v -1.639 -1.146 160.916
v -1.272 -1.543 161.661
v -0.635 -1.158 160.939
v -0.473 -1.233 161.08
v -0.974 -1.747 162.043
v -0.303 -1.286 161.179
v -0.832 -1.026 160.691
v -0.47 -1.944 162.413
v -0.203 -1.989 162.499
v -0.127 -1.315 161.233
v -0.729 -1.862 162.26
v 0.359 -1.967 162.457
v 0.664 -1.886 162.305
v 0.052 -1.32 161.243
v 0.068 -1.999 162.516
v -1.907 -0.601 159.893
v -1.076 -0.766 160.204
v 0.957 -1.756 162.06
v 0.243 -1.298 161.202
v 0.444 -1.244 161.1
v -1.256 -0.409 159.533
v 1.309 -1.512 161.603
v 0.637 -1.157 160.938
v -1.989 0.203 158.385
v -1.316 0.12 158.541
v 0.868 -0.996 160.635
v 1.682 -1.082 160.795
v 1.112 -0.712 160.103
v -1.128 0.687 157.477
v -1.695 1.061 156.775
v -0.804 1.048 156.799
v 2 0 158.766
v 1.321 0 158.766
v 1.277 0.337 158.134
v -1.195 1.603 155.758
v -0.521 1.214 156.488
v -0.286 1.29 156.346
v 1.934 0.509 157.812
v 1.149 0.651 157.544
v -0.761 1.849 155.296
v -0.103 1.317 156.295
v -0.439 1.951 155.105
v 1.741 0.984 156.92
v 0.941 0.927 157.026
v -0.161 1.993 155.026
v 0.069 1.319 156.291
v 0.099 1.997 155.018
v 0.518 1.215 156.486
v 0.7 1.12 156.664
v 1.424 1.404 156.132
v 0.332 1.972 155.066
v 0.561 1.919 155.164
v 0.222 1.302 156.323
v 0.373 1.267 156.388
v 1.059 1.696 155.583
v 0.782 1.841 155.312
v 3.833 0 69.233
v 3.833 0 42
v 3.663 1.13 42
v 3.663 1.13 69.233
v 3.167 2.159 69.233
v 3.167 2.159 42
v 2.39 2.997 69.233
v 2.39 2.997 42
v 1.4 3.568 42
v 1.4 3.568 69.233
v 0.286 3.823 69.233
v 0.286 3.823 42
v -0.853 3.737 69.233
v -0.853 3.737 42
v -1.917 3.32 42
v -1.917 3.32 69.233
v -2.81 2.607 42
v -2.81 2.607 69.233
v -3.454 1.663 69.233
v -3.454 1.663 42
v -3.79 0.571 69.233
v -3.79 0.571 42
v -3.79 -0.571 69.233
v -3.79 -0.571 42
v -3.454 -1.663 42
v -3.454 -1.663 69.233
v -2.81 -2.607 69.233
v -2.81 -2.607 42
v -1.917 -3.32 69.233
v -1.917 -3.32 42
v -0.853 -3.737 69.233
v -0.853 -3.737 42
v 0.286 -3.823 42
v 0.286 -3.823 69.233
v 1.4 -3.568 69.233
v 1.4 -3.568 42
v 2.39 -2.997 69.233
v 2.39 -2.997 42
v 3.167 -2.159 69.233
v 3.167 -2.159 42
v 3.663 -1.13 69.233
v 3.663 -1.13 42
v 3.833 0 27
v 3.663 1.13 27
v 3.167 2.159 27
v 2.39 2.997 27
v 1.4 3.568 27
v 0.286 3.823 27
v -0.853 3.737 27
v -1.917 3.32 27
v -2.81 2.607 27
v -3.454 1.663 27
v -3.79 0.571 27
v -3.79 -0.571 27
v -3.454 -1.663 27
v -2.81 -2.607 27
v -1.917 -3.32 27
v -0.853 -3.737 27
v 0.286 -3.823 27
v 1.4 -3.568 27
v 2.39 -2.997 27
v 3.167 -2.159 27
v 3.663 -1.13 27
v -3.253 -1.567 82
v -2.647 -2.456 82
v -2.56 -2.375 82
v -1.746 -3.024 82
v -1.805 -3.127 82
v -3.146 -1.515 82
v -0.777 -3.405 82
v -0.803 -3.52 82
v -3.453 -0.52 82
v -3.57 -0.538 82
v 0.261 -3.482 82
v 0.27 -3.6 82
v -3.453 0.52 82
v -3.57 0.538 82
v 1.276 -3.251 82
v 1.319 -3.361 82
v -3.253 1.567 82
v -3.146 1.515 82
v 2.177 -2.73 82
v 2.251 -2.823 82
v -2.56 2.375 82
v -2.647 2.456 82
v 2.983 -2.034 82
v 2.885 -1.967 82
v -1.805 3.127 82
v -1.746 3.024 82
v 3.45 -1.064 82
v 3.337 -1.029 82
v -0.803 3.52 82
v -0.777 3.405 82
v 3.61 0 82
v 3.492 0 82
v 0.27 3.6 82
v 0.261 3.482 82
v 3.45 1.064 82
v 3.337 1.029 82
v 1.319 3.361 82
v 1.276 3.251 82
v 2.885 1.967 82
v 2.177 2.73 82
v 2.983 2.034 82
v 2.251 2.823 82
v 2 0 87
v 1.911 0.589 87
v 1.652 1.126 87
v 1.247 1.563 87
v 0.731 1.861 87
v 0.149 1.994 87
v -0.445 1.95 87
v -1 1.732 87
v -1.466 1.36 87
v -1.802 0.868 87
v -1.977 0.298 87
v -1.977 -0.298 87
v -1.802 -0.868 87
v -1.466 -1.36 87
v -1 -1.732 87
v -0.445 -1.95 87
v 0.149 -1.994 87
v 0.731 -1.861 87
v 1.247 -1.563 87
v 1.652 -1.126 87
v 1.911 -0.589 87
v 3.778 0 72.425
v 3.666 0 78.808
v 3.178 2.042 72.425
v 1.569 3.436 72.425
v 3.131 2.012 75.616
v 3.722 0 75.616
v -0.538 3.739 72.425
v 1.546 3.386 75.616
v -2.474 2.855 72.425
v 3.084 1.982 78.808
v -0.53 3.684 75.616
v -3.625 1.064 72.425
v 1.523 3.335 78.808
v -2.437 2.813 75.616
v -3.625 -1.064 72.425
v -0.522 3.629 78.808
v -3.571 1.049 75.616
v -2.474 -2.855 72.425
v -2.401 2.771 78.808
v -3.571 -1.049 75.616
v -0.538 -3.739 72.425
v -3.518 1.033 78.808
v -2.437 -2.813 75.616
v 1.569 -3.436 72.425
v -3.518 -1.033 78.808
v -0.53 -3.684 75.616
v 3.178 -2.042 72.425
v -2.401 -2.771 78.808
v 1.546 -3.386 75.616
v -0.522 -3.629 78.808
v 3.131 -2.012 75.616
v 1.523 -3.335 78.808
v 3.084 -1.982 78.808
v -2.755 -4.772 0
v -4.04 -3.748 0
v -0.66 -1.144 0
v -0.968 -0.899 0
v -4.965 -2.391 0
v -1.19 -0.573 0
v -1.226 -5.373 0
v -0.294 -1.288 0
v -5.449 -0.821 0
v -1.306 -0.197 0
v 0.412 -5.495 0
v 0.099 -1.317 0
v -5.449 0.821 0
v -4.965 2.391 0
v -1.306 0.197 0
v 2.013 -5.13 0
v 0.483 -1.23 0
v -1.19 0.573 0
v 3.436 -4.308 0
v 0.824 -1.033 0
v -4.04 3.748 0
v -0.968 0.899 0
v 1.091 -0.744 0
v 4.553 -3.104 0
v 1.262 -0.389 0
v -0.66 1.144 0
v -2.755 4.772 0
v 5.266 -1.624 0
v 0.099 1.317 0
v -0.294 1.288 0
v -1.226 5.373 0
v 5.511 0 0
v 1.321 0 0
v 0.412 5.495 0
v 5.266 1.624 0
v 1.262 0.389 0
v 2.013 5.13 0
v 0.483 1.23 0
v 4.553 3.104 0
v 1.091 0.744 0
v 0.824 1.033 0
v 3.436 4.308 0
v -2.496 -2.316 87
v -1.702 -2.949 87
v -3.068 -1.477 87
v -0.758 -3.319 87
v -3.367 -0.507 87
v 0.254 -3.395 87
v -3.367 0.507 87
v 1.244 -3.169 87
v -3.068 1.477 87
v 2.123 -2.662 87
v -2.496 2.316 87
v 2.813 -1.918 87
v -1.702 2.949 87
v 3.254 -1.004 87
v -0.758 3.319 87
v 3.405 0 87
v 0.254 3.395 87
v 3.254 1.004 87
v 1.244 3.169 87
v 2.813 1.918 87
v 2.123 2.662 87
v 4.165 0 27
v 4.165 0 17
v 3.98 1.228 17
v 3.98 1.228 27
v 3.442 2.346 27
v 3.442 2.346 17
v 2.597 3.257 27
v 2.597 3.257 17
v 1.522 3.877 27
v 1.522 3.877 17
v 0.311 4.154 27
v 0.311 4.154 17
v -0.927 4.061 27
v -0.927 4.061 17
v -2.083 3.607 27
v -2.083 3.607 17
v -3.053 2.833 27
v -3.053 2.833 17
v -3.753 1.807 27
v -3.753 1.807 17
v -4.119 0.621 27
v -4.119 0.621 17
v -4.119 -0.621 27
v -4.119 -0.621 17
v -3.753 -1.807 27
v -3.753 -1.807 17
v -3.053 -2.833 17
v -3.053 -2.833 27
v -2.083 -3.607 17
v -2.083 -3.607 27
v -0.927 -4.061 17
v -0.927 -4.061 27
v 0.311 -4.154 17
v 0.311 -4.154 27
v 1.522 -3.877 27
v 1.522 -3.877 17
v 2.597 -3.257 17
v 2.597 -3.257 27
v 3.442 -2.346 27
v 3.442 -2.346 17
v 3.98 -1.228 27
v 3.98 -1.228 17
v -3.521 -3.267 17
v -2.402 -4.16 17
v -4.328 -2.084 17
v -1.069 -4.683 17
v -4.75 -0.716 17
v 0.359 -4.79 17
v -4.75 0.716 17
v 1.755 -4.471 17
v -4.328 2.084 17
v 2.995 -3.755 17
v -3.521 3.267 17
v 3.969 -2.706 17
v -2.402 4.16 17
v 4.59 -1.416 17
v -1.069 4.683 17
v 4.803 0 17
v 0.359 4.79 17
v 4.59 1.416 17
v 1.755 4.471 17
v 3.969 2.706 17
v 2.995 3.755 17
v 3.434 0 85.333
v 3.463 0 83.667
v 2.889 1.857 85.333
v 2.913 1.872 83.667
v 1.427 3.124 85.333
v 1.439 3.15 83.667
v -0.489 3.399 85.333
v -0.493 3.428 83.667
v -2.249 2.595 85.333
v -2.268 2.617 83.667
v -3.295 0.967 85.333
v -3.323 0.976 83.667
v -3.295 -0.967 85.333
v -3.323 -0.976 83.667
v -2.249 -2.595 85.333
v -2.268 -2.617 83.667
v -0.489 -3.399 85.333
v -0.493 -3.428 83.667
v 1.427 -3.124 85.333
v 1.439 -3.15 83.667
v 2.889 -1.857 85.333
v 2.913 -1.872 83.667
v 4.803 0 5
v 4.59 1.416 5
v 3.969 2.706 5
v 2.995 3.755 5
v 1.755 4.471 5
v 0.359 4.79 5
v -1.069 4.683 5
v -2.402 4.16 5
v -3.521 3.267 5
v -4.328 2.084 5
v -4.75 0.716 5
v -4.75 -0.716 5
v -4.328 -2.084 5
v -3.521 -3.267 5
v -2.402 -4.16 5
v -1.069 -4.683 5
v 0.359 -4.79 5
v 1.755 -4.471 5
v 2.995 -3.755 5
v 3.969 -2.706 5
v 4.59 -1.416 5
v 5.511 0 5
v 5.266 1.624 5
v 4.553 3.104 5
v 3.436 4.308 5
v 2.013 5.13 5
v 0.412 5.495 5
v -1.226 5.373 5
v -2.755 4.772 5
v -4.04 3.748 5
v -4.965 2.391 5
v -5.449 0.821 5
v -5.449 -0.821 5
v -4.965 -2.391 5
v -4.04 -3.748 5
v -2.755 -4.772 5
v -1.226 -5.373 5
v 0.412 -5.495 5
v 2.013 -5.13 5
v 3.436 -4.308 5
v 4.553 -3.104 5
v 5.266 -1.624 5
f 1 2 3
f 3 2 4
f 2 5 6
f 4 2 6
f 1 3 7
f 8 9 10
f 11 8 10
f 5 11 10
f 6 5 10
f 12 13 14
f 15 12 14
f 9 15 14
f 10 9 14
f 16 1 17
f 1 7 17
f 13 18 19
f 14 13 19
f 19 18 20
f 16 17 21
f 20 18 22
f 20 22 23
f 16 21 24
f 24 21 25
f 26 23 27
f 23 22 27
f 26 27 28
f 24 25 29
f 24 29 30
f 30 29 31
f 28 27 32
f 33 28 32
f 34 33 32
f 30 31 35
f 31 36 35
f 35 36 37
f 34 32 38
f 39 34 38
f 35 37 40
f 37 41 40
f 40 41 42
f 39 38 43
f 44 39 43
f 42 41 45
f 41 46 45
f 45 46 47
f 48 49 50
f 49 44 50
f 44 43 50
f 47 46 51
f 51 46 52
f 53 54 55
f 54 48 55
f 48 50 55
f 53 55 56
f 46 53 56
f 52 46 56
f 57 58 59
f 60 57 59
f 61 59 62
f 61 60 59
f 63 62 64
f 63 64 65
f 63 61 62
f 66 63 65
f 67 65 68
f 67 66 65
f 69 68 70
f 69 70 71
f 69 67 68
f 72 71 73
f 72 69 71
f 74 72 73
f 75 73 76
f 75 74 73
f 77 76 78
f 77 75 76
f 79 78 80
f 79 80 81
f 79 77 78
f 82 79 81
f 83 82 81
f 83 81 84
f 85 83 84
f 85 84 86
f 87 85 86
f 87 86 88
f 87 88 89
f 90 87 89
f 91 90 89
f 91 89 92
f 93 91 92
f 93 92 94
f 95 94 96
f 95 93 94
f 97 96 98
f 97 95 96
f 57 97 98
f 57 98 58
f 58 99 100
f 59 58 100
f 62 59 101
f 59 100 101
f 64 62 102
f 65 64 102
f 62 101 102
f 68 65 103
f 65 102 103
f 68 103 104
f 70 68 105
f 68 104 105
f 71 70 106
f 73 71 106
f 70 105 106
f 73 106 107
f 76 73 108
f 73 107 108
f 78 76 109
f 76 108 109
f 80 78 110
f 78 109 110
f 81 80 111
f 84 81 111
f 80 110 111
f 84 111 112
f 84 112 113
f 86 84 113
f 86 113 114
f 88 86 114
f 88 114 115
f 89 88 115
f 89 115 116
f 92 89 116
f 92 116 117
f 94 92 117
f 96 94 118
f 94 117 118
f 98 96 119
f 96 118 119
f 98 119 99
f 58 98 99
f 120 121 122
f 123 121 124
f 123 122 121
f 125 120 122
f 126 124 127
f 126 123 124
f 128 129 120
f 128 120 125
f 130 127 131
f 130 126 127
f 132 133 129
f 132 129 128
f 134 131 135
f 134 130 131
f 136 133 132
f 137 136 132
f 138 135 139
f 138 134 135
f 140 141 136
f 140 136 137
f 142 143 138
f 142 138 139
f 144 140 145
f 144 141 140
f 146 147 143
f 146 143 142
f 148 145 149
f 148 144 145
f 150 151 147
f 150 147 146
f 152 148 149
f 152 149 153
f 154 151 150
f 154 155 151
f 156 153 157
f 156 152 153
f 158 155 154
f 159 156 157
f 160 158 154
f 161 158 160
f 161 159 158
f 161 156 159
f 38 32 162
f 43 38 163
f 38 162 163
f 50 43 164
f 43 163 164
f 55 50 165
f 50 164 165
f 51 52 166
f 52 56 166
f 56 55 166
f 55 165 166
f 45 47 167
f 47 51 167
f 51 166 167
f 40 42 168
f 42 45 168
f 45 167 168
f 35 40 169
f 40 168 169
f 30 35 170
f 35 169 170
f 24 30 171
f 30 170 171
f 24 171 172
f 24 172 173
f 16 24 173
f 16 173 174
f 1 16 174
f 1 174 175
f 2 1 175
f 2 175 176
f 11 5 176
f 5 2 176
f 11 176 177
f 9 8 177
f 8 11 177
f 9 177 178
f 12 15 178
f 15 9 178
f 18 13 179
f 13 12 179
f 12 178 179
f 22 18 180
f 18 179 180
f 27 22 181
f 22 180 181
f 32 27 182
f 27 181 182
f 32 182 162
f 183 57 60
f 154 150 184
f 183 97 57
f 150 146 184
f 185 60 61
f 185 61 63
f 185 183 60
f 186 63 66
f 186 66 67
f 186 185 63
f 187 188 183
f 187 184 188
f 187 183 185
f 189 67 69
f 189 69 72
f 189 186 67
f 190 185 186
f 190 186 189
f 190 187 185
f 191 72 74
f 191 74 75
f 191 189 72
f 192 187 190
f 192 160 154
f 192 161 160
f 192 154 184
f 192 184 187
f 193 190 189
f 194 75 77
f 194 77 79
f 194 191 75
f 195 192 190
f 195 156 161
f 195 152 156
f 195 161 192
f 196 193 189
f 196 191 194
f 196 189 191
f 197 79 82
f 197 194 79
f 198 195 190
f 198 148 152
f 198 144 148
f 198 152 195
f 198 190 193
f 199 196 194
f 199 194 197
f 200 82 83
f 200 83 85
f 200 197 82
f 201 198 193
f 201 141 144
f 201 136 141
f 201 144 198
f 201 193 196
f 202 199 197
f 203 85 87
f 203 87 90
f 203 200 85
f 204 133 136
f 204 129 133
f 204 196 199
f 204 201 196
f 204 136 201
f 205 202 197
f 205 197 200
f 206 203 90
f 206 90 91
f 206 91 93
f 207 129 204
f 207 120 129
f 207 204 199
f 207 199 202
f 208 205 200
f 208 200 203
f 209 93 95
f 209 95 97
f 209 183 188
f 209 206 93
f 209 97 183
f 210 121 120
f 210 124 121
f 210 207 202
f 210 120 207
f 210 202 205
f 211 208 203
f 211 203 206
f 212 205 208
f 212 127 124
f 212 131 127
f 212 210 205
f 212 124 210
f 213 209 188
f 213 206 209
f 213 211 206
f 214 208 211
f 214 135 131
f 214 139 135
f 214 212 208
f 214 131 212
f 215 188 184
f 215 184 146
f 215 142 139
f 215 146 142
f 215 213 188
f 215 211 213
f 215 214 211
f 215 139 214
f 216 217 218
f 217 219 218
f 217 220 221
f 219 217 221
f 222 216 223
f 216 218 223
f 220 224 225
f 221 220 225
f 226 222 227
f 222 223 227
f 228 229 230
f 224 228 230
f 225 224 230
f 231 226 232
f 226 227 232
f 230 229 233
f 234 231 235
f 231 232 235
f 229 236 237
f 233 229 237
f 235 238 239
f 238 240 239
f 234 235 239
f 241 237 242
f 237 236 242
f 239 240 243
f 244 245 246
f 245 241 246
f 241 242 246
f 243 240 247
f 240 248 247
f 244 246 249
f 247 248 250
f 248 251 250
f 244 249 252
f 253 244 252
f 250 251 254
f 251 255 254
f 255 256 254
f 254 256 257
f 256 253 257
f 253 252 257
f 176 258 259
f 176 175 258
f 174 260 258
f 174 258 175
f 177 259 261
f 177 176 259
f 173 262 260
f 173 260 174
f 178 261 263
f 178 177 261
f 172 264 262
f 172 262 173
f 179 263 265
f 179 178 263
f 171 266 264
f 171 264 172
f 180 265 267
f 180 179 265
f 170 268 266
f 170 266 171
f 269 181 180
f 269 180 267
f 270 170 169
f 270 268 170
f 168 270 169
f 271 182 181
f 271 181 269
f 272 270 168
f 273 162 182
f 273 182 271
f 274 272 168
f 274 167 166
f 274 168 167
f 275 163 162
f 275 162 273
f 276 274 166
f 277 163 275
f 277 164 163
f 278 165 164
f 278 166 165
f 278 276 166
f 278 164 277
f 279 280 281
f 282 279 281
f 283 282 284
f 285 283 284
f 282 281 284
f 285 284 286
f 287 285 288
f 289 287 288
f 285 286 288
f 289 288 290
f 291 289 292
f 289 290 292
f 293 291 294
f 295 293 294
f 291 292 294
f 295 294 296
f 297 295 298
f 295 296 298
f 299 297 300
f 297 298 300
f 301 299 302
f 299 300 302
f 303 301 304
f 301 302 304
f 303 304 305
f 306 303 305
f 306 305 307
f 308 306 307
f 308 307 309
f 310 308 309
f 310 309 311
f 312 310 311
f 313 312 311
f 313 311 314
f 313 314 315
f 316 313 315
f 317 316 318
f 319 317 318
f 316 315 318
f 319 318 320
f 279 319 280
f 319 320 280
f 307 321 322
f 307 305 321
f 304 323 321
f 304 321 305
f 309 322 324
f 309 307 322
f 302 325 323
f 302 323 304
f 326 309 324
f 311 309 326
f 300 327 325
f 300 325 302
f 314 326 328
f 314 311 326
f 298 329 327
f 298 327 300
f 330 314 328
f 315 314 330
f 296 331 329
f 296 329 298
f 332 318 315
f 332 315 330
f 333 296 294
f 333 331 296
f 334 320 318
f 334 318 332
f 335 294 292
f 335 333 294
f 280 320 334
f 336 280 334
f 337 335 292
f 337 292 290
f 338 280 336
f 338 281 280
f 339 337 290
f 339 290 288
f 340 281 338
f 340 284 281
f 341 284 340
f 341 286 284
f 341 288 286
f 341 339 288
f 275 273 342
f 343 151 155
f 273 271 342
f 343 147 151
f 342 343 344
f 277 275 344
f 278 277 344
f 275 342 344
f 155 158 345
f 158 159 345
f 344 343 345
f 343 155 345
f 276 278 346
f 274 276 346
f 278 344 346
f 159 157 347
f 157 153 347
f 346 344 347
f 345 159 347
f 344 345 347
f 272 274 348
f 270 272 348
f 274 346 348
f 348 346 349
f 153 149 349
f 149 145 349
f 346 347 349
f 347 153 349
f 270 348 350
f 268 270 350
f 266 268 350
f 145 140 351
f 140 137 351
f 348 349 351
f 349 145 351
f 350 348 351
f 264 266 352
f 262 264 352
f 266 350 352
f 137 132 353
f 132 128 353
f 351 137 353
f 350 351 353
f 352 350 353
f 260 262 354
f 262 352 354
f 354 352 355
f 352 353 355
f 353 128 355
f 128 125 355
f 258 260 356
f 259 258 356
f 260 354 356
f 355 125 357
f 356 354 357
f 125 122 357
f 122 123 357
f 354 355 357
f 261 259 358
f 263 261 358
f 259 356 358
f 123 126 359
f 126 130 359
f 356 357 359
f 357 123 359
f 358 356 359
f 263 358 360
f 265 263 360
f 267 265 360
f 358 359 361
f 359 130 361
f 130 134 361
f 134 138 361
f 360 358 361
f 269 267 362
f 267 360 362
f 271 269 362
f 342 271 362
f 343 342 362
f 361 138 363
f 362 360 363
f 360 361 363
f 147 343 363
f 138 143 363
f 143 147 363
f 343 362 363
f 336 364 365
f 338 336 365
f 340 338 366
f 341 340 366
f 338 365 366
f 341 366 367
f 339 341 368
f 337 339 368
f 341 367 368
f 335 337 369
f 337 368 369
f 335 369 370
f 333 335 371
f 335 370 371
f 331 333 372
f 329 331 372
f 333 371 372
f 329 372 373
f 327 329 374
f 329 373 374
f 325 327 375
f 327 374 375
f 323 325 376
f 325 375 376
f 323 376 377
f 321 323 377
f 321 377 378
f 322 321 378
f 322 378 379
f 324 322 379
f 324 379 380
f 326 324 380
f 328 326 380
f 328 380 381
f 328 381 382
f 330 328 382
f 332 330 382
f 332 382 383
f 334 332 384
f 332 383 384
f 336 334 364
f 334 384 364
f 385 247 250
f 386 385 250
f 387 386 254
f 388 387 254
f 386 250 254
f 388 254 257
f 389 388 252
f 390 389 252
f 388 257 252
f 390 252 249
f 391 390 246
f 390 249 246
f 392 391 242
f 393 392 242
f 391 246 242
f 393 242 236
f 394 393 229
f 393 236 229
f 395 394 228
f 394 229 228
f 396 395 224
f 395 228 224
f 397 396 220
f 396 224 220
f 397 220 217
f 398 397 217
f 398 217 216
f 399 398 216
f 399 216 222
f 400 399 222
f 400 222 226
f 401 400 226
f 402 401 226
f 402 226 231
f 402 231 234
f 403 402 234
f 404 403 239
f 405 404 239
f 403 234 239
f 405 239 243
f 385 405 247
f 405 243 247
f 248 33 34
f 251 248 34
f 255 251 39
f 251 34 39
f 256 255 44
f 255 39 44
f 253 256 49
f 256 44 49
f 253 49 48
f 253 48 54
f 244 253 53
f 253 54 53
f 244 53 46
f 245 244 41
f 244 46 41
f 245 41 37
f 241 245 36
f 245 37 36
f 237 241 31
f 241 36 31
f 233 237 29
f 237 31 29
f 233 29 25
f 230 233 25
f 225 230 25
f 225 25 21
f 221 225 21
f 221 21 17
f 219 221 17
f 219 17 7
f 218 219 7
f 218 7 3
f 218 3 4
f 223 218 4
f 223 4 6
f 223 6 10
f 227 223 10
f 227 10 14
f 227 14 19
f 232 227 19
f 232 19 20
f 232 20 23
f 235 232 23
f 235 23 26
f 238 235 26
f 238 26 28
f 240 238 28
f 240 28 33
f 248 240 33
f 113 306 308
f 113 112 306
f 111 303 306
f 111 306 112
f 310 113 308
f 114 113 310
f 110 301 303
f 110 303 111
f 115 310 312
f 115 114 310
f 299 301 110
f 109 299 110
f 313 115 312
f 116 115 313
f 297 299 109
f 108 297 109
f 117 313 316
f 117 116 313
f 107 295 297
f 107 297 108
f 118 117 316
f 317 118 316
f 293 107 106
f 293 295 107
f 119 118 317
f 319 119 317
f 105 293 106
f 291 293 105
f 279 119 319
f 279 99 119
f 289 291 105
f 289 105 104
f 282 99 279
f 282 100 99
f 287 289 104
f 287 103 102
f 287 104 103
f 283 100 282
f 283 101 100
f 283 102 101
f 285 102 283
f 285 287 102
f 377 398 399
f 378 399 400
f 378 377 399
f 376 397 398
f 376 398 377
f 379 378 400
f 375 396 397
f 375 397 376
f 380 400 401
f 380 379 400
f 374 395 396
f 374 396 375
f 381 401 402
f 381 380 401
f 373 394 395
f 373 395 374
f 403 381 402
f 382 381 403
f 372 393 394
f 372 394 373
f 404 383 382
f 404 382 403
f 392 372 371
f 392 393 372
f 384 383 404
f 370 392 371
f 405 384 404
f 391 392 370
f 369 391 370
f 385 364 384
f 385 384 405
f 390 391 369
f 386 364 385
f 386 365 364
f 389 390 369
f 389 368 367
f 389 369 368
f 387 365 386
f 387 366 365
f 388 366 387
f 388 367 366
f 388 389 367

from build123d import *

# Parameters (mm, degrees)
SKETCH1_R           = 5.510734027
BOSS_EXTRUDE1_DEPTH = 5
SKETCH2_R           = 4.80322663
BOSS_EXTRUDE2_DEPTH = 12
SKETCH3_R           = 4.165391046
BOSS_EXTRUDE3_DEPTH = 10
SKETCH4_R           = 3.833295876
BOSS_EXTRUDE4_DEPTH = 15
SKETCH5_R           = 3.610443511
BOSS_EXTRUDE5_DEPTH = 40
SKETCH6_R           = 3.404861597
BOSS_EXTRUDE6_DEPTH = 5
DRAFT3_ANGLE        = 1
SKETCH7_R           = 1.999677314
BOSS_EXTRUDE7_DEPTH = 80
SKETCH8_R           = 1.320990831
CUT_EXTRUDE1_DEPTH  = 170
SKETCH9_W           = 6.196430892
SKETCH9_H           = 6.69100276
BOSS_EXTRUDE8_DEPTH = 5
CUT_EXTRUDE3_DEPTH  = 40


# Read off the part's stored shape, not the designer's step: Draft1
with BuildPart() as part:
    # Sketch1 → Boss-Extrude1 (new body)
    with BuildSketch(Plane.XY):
        Circle(SKETCH1_R)
    extrude(amount=BOSS_EXTRUDE1_DEPTH)

    # Sketch2 → Boss-Extrude2 (add)
    with BuildSketch(Plane.XY.offset(5)):
        Circle(SKETCH2_R)
    extrude(amount=BOSS_EXTRUDE2_DEPTH)

    # Sketch3 → Boss-Extrude3 (add)
    with BuildSketch(Plane.XY.offset(17)):
        Circle(SKETCH3_R)
    extrude(amount=BOSS_EXTRUDE3_DEPTH)

    # Sketch4 → Boss-Extrude4 (add)
    with BuildSketch(Plane.XY.offset(27)):
        Circle(SKETCH4_R)
    extrude(amount=BOSS_EXTRUDE4_DEPTH)

    # Sketch5 → Boss-Extrude5 (add)
    with BuildSketch(Plane.XY.offset(42)):
        Circle(SKETCH5_R)
    extrude(amount=BOSS_EXTRUDE5_DEPTH)

    # Draft1 outline → Draft1 (revolve)
    with BuildSketch(Plane.XZ):
        Polygon((3.833295876, 42), (3.833295876, 69.232796586), (3.610443511, 82), (3.610443511, 42), align=None)
    revolve(axis=Axis((0, 0, 0), (0, 0, 1)))

    # Sketch6 → Boss-Extrude6 (add)
    with BuildSketch(Plane.XY.offset(82)):
        Circle(SKETCH6_R)
    extrude(amount=BOSS_EXTRUDE6_DEPTH)

    # Draft3
    draft3_faces = [part.faces().sort_by_distance(p)[0] for p in [
        (-3.404861597, 0, 84.5),
    ]]
    draft(draft3_faces, Plane.XY.offset(87), DRAFT3_ANGLE)

    # Sketch7 → Boss-Extrude7 (add)
    with BuildSketch(Plane.XY.offset(87)):
        Circle(SKETCH7_R)
    extrude(amount=BOSS_EXTRUDE7_DEPTH)

    # Sketch8 → Cut-Extrude1 (cut)
    with BuildSketch(Plane.XY.offset(167)):
        Circle(SKETCH8_R)
    extrude(amount=-CUT_EXTRUDE1_DEPTH, mode=Mode.SUBTRACT)

    # Sketch9 → Boss-Extrude8 (add)
    with BuildSketch(Plane.XY.offset(167)):
        with Locations((-0.356570781, -0.45222472)):
            Rectangle(SKETCH9_W, SKETCH9_H)
    extrude(amount=BOSS_EXTRUDE8_DEPTH)

    # Sketch10 → Cut-Extrude3 (cut)
    with BuildSketch(Plane(origin=(2.741644665, 0, 0), x_dir=(0, 0, -1), z_dir=(1, 0, 0))):
        Polygon((-152.074864923, 3.565905239), (-141.864160289, 3.91336171), (-152.717774104, 10.240072861), (-183.049805068, 3.30023825), (-173.245812896, -7.716844209), align=None)
    extrude(amount=-CUT_EXTRUDE3_DEPTH, mode=Mode.SUBTRACT)


solid = part.part
